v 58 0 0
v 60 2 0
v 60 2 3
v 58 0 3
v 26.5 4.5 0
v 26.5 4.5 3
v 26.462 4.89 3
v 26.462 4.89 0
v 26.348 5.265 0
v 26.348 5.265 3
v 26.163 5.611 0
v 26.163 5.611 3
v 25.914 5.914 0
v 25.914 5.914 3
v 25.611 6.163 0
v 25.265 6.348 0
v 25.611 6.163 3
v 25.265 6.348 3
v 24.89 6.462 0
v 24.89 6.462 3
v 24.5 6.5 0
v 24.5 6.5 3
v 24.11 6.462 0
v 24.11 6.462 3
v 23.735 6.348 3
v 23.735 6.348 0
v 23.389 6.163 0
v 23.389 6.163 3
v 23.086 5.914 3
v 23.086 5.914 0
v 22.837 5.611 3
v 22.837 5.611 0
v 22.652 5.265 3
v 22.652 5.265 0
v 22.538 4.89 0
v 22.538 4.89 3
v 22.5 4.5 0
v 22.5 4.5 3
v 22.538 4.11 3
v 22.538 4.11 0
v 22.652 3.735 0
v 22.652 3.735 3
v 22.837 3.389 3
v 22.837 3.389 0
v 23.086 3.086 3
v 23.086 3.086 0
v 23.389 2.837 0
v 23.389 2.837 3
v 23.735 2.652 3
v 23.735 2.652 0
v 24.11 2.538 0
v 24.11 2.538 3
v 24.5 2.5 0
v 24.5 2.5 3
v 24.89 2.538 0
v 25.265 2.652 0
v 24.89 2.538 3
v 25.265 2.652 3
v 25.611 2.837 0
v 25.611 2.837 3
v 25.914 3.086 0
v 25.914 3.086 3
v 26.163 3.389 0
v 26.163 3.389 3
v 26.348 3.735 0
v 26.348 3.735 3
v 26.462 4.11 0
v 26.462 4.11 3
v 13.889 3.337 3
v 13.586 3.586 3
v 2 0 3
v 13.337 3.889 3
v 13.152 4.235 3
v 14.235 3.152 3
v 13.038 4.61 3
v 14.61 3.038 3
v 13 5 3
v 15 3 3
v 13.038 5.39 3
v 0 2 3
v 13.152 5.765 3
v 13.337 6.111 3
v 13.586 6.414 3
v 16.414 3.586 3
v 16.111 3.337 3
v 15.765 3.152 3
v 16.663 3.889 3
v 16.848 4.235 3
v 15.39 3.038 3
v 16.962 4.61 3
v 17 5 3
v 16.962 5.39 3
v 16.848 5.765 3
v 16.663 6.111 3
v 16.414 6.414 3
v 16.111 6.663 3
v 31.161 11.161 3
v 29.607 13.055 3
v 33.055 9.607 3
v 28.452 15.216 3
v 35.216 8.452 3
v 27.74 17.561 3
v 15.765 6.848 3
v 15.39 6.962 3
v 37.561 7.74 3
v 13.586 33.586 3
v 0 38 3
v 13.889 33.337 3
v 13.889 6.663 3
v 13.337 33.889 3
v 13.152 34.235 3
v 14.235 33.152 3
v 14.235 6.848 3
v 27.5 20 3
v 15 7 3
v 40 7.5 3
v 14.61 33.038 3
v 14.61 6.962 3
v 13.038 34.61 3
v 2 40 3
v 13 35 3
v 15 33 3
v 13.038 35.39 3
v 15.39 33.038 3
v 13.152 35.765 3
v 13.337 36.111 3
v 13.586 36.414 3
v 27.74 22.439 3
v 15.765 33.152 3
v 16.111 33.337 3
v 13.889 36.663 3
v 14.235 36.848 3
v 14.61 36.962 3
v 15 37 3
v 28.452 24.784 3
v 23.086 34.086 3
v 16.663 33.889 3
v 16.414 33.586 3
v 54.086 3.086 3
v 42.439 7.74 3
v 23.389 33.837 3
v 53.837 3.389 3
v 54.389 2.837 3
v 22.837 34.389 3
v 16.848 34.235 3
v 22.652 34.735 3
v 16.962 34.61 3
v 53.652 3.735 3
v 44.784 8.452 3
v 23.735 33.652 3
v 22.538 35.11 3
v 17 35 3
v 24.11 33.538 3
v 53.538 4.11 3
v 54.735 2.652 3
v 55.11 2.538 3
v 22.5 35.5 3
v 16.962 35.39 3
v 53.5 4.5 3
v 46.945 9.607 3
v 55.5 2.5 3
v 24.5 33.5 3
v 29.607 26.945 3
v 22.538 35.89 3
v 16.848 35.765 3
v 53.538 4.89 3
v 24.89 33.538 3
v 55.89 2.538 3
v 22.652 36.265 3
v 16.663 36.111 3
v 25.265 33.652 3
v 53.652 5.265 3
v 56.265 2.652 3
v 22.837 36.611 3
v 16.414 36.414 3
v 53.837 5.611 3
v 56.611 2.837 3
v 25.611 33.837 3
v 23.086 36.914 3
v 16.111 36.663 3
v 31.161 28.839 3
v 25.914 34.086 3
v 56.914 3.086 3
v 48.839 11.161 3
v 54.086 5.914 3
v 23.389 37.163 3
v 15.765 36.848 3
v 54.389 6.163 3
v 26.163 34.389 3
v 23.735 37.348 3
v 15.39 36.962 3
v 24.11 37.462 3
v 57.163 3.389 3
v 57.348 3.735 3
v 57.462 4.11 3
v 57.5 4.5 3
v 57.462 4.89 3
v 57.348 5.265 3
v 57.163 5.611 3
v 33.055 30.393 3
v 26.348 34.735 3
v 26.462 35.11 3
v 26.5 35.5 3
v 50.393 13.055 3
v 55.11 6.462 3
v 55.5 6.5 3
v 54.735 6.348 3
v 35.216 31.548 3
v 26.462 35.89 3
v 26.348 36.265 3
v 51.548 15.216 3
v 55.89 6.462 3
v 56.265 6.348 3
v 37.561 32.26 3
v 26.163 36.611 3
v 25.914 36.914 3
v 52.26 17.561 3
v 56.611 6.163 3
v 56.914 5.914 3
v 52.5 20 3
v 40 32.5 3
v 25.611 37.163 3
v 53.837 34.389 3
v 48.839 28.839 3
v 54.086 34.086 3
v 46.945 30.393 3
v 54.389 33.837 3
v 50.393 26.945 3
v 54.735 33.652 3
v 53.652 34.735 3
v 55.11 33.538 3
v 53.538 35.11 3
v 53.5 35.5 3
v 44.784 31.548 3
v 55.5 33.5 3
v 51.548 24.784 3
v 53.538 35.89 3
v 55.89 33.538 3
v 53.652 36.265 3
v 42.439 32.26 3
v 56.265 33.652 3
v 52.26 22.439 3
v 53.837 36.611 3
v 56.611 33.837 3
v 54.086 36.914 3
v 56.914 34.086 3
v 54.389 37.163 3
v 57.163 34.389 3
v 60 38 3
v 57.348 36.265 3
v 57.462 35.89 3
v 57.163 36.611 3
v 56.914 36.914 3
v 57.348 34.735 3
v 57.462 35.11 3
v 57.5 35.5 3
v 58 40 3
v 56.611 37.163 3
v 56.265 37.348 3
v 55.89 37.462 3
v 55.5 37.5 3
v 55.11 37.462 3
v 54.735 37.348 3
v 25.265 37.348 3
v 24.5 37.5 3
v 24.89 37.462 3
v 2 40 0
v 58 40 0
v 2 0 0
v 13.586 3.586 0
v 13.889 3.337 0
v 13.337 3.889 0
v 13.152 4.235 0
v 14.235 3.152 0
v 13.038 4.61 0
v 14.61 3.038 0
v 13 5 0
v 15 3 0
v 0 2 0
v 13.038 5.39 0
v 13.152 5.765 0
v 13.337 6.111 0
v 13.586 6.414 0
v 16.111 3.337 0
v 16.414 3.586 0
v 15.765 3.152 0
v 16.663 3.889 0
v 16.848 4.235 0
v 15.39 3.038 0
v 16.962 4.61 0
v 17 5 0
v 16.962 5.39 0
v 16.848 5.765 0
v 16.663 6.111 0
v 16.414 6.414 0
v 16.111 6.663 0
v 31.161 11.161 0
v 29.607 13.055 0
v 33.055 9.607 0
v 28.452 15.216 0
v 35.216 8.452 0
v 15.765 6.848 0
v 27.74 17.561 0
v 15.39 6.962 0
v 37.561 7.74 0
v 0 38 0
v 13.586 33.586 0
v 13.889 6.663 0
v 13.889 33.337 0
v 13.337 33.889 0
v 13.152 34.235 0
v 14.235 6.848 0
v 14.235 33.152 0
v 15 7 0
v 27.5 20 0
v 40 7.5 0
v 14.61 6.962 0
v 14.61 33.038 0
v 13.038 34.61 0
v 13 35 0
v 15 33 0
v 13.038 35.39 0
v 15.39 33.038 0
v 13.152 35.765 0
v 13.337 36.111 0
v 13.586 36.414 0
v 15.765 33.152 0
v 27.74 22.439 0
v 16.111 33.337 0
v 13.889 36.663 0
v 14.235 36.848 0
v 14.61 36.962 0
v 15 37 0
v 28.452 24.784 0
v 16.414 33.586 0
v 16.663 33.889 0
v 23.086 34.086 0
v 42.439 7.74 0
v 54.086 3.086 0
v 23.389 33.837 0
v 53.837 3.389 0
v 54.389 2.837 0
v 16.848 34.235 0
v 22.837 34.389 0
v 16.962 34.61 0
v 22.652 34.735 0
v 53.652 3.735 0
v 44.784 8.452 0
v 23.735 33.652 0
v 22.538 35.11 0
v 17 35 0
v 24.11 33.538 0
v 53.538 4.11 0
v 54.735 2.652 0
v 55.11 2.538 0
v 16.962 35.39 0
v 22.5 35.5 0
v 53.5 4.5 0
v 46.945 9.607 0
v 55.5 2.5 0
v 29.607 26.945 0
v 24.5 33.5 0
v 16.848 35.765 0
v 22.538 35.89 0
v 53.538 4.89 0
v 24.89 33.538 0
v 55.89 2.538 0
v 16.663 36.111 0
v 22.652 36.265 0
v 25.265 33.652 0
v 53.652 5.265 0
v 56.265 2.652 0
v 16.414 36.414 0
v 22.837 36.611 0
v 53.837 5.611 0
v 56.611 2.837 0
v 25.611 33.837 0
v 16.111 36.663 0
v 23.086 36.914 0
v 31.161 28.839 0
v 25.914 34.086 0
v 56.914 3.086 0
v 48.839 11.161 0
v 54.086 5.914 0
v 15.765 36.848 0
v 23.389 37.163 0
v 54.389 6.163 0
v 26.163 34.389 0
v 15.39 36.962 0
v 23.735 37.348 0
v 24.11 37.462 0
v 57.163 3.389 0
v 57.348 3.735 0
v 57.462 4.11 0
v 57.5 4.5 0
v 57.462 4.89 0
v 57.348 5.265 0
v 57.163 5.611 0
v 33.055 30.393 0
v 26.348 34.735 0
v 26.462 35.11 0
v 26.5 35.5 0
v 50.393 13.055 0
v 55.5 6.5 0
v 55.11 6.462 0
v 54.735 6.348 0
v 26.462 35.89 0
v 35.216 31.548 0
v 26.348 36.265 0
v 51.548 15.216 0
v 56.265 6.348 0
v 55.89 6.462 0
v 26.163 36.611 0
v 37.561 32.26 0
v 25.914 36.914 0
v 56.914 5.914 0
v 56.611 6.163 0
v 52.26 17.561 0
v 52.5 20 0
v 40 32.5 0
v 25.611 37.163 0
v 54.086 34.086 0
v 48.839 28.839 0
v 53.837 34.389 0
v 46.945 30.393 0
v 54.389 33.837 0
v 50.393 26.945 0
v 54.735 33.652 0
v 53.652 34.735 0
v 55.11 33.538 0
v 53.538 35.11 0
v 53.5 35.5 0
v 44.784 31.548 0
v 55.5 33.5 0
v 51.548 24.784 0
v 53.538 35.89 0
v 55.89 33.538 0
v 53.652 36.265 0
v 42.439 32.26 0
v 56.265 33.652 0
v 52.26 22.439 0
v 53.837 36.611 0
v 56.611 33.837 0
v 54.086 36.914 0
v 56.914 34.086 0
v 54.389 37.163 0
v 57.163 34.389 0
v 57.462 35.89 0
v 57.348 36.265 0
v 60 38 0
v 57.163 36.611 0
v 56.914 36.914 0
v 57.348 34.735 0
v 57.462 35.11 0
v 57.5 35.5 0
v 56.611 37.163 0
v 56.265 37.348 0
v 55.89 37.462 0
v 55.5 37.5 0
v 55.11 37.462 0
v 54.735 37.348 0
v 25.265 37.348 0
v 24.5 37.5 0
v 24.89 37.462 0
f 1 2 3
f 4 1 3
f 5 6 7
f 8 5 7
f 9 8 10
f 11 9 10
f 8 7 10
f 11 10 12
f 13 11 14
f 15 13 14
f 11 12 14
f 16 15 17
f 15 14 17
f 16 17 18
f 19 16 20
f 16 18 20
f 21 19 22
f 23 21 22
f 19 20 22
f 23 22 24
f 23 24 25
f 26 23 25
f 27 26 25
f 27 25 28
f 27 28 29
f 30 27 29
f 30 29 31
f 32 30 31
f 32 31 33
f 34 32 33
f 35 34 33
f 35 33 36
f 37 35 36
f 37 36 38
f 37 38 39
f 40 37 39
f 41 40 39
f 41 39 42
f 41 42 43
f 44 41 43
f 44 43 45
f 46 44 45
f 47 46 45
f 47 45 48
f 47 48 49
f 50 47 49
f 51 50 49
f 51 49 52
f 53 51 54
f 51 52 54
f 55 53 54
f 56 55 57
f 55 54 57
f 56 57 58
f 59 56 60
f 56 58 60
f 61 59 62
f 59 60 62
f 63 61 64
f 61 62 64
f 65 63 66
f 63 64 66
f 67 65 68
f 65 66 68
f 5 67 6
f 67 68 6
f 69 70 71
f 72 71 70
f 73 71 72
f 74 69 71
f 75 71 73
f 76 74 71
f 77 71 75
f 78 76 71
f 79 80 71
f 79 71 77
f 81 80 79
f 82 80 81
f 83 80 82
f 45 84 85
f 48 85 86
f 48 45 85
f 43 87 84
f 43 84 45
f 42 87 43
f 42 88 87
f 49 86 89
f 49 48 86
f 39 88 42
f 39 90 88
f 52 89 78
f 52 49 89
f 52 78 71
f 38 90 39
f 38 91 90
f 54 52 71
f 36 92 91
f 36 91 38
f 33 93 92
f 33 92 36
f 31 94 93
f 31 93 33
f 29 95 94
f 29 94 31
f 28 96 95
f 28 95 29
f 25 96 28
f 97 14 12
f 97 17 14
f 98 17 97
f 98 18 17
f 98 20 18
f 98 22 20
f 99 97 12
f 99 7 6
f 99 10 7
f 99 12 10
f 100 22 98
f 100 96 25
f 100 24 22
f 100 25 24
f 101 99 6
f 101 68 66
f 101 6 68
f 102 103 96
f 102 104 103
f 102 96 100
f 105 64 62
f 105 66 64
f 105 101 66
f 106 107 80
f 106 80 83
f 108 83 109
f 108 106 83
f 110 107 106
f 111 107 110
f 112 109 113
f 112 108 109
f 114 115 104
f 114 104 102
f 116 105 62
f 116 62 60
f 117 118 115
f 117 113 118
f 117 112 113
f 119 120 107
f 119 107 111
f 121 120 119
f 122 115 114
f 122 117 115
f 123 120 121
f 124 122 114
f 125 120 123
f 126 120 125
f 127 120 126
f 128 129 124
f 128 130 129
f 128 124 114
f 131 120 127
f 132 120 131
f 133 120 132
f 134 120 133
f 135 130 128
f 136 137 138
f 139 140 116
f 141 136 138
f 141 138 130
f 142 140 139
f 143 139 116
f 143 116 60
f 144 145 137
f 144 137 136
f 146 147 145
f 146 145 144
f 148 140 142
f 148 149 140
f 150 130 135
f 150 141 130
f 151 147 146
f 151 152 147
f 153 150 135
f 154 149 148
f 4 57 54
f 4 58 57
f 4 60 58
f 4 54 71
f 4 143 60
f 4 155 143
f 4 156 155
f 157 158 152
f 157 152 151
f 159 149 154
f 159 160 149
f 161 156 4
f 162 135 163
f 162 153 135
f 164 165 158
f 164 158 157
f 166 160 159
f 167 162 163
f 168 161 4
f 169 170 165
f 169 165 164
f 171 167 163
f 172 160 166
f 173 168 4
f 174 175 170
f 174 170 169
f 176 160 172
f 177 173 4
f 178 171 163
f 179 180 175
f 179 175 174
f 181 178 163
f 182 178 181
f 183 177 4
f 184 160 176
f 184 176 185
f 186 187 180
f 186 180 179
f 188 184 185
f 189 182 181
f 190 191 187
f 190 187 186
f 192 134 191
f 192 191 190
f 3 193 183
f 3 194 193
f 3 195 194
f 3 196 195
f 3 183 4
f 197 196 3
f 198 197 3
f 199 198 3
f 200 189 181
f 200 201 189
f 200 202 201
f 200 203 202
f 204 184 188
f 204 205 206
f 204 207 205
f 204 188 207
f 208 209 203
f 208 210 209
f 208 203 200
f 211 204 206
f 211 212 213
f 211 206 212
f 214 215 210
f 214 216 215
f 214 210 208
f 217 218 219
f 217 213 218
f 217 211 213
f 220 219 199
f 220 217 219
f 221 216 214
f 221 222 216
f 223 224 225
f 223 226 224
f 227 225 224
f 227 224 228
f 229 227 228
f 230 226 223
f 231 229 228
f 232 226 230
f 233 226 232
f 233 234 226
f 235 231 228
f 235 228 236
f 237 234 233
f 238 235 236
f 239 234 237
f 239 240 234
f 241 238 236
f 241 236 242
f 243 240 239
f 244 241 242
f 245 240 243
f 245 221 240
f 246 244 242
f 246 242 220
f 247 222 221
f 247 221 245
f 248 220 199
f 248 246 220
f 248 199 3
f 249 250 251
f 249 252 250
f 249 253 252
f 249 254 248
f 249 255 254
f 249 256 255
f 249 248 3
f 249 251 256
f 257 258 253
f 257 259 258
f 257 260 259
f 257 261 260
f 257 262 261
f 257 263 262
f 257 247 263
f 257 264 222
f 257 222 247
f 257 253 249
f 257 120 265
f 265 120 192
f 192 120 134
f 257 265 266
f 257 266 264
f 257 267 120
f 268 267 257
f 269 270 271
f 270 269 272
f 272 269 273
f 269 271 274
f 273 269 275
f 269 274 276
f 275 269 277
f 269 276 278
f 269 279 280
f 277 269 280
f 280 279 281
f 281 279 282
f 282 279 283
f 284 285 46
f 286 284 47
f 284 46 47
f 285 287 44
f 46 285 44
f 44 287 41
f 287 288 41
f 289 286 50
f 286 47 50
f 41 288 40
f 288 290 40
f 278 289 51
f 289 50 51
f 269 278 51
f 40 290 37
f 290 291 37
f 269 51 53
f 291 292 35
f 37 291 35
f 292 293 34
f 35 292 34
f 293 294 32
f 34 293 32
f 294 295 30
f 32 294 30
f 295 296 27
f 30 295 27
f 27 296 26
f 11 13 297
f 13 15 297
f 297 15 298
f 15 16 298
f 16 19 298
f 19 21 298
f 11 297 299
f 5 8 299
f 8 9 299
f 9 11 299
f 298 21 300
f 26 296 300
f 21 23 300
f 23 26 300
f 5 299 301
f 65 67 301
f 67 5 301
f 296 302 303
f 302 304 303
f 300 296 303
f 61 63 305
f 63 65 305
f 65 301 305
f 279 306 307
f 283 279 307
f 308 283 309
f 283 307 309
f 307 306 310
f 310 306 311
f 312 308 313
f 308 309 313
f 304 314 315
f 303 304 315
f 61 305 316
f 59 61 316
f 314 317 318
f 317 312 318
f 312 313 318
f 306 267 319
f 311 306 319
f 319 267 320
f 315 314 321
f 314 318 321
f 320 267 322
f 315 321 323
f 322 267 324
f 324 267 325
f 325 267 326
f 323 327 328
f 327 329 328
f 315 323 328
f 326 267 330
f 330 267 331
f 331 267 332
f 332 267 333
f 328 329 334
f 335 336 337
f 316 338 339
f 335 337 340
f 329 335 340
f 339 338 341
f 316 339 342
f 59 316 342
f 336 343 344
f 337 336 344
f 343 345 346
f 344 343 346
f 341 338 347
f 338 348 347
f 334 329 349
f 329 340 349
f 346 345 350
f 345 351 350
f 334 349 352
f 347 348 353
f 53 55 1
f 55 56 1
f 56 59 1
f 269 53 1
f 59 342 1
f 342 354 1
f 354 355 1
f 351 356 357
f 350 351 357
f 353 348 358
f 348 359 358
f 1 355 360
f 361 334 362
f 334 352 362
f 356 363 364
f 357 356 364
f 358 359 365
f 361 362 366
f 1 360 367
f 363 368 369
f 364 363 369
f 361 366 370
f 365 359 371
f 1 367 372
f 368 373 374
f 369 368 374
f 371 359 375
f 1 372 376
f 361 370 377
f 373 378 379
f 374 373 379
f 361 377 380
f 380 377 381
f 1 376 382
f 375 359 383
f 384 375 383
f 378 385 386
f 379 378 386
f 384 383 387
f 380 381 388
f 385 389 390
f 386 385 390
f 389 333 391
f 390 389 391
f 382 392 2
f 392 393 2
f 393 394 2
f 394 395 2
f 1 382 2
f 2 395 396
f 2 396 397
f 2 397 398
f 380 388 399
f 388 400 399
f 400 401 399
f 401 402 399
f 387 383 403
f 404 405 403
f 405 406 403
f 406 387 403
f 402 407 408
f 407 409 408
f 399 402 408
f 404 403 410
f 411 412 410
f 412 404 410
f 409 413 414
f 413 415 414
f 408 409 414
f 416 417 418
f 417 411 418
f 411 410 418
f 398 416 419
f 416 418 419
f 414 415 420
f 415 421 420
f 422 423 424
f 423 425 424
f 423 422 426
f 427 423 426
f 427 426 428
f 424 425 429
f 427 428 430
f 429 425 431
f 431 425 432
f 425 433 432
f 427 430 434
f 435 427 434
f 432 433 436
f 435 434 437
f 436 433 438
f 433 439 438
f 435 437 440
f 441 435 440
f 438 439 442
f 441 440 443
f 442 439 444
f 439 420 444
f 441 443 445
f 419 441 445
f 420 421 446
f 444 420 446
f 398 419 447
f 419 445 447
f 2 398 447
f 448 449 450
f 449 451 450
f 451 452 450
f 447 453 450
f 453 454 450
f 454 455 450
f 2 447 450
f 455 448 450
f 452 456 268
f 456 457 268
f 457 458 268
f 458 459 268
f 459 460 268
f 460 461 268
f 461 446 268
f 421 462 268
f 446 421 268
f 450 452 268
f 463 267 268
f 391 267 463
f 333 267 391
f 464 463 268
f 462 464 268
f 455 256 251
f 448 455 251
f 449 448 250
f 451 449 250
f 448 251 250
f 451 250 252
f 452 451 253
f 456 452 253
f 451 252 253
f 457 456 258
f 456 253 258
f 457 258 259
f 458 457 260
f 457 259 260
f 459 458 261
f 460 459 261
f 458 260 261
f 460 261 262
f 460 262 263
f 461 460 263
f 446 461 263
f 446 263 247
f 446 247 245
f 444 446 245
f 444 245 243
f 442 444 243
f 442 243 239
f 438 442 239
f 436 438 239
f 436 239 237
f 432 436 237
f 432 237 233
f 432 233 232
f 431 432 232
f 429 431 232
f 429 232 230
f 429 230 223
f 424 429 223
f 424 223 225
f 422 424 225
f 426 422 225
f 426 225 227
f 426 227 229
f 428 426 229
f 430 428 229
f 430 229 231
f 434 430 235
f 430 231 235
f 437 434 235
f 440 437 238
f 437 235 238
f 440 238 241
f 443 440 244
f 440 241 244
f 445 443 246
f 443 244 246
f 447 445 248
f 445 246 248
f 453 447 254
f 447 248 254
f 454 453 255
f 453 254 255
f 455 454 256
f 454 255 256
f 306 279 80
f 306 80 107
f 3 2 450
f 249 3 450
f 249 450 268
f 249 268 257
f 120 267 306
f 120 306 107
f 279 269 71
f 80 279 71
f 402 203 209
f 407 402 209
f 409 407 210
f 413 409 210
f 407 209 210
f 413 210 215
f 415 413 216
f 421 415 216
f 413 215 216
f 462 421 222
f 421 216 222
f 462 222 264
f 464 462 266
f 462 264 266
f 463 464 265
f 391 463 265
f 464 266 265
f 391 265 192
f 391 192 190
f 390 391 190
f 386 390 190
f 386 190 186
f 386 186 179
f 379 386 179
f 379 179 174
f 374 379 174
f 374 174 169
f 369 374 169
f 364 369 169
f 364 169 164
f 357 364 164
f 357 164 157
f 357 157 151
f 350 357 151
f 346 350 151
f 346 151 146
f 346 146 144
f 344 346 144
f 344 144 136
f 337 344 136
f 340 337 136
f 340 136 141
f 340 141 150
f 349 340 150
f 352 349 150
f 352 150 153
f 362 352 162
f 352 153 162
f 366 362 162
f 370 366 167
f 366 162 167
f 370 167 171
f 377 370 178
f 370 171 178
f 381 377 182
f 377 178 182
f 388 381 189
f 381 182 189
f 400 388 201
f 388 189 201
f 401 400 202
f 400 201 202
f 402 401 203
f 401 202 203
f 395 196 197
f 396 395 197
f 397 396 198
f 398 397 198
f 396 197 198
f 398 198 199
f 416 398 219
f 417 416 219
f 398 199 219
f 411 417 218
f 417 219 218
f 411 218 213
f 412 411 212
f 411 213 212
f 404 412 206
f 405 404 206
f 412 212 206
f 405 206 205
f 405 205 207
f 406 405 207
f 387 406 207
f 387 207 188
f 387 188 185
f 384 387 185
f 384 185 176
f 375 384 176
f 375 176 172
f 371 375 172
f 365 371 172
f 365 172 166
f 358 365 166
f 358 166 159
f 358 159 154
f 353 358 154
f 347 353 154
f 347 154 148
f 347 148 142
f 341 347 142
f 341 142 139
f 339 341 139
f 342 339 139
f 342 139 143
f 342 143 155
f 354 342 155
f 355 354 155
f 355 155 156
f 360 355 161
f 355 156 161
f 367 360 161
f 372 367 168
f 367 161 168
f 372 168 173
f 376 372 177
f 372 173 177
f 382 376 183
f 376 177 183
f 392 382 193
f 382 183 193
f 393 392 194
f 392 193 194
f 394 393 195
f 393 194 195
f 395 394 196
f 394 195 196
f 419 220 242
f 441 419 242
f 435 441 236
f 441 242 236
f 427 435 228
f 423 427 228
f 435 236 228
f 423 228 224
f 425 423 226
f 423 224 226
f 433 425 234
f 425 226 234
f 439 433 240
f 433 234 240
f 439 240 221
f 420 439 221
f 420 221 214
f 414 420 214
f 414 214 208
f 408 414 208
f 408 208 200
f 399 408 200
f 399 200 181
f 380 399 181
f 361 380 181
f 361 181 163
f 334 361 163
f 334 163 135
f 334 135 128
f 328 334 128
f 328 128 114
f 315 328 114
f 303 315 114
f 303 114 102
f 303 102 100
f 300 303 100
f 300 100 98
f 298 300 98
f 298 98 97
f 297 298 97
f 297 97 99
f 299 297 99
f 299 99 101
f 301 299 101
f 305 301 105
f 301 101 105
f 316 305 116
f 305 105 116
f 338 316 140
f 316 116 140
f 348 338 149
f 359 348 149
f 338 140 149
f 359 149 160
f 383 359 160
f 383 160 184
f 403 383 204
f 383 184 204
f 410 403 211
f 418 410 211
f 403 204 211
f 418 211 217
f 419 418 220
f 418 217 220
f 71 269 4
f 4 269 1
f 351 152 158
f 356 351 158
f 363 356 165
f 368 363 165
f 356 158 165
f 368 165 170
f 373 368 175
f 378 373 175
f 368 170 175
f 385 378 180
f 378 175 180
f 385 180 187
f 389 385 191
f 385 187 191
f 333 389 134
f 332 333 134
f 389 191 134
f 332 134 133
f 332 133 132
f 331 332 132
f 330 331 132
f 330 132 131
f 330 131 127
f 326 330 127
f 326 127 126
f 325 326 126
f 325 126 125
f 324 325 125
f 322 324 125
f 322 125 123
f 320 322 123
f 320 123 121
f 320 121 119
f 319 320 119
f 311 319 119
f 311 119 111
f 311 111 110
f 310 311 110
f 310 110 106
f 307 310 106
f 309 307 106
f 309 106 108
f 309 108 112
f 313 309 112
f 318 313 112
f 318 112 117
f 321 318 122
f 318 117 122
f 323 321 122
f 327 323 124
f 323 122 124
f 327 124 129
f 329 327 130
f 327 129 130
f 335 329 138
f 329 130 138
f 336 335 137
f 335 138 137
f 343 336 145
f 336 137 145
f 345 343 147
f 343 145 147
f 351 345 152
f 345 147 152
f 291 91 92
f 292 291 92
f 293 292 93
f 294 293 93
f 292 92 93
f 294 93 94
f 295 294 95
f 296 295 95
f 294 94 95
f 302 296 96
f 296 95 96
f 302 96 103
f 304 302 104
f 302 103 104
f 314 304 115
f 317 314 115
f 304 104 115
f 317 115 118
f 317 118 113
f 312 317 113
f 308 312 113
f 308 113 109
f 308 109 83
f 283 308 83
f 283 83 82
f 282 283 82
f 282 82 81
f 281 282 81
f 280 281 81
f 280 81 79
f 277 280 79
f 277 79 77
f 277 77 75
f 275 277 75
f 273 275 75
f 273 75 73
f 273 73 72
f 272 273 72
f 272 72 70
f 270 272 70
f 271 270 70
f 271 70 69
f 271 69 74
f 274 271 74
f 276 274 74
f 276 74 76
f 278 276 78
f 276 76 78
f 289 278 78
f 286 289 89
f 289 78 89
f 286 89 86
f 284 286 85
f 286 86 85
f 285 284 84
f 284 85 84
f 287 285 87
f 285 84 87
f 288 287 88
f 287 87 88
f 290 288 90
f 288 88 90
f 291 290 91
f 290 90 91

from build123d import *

# Parameters (mm, degrees)
SKETCH1_W           = 60
SKETCH1_H           = 40
BOSS_EXTRUDE1_DEPTH = 3
SKETCH2_R           = 2
SKETCH2_R_2         = 12.5
CUT_EXTRUDE1_DEPTH  = 73.173402303
CHAMFER1_SIZE       = 2


with BuildPart() as part:
    # Sketch1 → Boss-Extrude1 (new body)
    with BuildSketch(Plane.XY):
        with Locations((30, 20)):
            Rectangle(SKETCH1_W, SKETCH1_H)
    extrude(amount=BOSS_EXTRUDE1_DEPTH)

    # Sketch2 → Cut-Extrude1 (cut, through all)
    with BuildSketch(Plane.XY.offset(3)):
        with Locations((24.5, 35.5)):
            Circle(SKETCH2_R)
        with Locations((55.5, 35.5)):
            Circle(SKETCH2_R)
        with Locations((55.5, 4.5)):
            Circle(SKETCH2_R)
        with Locations((24.5, 4.5)):
            Circle(SKETCH2_R)
        with Locations((40, 20)):
            Circle(SKETCH2_R_2)
        with Locations((15, 35)):
            Circle(SKETCH2_R)
        with Locations((15, 5)):
            Circle(SKETCH2_R)
    extrude(amount=-CUT_EXTRUDE1_DEPTH, mode=Mode.SUBTRACT)

    # Chamfer1
    chamfer1_edges = [part.edges().sort_by_distance(p)[0] for p in [
        (0, 40, 1.5),
        (60, 40, 1.5),
        (60, 0, 1.5),
        (0, 0, 1.5),
    ]]
    chamfer(chamfer1_edges, length=CHAMFER1_SIZE)


solid = part.part
